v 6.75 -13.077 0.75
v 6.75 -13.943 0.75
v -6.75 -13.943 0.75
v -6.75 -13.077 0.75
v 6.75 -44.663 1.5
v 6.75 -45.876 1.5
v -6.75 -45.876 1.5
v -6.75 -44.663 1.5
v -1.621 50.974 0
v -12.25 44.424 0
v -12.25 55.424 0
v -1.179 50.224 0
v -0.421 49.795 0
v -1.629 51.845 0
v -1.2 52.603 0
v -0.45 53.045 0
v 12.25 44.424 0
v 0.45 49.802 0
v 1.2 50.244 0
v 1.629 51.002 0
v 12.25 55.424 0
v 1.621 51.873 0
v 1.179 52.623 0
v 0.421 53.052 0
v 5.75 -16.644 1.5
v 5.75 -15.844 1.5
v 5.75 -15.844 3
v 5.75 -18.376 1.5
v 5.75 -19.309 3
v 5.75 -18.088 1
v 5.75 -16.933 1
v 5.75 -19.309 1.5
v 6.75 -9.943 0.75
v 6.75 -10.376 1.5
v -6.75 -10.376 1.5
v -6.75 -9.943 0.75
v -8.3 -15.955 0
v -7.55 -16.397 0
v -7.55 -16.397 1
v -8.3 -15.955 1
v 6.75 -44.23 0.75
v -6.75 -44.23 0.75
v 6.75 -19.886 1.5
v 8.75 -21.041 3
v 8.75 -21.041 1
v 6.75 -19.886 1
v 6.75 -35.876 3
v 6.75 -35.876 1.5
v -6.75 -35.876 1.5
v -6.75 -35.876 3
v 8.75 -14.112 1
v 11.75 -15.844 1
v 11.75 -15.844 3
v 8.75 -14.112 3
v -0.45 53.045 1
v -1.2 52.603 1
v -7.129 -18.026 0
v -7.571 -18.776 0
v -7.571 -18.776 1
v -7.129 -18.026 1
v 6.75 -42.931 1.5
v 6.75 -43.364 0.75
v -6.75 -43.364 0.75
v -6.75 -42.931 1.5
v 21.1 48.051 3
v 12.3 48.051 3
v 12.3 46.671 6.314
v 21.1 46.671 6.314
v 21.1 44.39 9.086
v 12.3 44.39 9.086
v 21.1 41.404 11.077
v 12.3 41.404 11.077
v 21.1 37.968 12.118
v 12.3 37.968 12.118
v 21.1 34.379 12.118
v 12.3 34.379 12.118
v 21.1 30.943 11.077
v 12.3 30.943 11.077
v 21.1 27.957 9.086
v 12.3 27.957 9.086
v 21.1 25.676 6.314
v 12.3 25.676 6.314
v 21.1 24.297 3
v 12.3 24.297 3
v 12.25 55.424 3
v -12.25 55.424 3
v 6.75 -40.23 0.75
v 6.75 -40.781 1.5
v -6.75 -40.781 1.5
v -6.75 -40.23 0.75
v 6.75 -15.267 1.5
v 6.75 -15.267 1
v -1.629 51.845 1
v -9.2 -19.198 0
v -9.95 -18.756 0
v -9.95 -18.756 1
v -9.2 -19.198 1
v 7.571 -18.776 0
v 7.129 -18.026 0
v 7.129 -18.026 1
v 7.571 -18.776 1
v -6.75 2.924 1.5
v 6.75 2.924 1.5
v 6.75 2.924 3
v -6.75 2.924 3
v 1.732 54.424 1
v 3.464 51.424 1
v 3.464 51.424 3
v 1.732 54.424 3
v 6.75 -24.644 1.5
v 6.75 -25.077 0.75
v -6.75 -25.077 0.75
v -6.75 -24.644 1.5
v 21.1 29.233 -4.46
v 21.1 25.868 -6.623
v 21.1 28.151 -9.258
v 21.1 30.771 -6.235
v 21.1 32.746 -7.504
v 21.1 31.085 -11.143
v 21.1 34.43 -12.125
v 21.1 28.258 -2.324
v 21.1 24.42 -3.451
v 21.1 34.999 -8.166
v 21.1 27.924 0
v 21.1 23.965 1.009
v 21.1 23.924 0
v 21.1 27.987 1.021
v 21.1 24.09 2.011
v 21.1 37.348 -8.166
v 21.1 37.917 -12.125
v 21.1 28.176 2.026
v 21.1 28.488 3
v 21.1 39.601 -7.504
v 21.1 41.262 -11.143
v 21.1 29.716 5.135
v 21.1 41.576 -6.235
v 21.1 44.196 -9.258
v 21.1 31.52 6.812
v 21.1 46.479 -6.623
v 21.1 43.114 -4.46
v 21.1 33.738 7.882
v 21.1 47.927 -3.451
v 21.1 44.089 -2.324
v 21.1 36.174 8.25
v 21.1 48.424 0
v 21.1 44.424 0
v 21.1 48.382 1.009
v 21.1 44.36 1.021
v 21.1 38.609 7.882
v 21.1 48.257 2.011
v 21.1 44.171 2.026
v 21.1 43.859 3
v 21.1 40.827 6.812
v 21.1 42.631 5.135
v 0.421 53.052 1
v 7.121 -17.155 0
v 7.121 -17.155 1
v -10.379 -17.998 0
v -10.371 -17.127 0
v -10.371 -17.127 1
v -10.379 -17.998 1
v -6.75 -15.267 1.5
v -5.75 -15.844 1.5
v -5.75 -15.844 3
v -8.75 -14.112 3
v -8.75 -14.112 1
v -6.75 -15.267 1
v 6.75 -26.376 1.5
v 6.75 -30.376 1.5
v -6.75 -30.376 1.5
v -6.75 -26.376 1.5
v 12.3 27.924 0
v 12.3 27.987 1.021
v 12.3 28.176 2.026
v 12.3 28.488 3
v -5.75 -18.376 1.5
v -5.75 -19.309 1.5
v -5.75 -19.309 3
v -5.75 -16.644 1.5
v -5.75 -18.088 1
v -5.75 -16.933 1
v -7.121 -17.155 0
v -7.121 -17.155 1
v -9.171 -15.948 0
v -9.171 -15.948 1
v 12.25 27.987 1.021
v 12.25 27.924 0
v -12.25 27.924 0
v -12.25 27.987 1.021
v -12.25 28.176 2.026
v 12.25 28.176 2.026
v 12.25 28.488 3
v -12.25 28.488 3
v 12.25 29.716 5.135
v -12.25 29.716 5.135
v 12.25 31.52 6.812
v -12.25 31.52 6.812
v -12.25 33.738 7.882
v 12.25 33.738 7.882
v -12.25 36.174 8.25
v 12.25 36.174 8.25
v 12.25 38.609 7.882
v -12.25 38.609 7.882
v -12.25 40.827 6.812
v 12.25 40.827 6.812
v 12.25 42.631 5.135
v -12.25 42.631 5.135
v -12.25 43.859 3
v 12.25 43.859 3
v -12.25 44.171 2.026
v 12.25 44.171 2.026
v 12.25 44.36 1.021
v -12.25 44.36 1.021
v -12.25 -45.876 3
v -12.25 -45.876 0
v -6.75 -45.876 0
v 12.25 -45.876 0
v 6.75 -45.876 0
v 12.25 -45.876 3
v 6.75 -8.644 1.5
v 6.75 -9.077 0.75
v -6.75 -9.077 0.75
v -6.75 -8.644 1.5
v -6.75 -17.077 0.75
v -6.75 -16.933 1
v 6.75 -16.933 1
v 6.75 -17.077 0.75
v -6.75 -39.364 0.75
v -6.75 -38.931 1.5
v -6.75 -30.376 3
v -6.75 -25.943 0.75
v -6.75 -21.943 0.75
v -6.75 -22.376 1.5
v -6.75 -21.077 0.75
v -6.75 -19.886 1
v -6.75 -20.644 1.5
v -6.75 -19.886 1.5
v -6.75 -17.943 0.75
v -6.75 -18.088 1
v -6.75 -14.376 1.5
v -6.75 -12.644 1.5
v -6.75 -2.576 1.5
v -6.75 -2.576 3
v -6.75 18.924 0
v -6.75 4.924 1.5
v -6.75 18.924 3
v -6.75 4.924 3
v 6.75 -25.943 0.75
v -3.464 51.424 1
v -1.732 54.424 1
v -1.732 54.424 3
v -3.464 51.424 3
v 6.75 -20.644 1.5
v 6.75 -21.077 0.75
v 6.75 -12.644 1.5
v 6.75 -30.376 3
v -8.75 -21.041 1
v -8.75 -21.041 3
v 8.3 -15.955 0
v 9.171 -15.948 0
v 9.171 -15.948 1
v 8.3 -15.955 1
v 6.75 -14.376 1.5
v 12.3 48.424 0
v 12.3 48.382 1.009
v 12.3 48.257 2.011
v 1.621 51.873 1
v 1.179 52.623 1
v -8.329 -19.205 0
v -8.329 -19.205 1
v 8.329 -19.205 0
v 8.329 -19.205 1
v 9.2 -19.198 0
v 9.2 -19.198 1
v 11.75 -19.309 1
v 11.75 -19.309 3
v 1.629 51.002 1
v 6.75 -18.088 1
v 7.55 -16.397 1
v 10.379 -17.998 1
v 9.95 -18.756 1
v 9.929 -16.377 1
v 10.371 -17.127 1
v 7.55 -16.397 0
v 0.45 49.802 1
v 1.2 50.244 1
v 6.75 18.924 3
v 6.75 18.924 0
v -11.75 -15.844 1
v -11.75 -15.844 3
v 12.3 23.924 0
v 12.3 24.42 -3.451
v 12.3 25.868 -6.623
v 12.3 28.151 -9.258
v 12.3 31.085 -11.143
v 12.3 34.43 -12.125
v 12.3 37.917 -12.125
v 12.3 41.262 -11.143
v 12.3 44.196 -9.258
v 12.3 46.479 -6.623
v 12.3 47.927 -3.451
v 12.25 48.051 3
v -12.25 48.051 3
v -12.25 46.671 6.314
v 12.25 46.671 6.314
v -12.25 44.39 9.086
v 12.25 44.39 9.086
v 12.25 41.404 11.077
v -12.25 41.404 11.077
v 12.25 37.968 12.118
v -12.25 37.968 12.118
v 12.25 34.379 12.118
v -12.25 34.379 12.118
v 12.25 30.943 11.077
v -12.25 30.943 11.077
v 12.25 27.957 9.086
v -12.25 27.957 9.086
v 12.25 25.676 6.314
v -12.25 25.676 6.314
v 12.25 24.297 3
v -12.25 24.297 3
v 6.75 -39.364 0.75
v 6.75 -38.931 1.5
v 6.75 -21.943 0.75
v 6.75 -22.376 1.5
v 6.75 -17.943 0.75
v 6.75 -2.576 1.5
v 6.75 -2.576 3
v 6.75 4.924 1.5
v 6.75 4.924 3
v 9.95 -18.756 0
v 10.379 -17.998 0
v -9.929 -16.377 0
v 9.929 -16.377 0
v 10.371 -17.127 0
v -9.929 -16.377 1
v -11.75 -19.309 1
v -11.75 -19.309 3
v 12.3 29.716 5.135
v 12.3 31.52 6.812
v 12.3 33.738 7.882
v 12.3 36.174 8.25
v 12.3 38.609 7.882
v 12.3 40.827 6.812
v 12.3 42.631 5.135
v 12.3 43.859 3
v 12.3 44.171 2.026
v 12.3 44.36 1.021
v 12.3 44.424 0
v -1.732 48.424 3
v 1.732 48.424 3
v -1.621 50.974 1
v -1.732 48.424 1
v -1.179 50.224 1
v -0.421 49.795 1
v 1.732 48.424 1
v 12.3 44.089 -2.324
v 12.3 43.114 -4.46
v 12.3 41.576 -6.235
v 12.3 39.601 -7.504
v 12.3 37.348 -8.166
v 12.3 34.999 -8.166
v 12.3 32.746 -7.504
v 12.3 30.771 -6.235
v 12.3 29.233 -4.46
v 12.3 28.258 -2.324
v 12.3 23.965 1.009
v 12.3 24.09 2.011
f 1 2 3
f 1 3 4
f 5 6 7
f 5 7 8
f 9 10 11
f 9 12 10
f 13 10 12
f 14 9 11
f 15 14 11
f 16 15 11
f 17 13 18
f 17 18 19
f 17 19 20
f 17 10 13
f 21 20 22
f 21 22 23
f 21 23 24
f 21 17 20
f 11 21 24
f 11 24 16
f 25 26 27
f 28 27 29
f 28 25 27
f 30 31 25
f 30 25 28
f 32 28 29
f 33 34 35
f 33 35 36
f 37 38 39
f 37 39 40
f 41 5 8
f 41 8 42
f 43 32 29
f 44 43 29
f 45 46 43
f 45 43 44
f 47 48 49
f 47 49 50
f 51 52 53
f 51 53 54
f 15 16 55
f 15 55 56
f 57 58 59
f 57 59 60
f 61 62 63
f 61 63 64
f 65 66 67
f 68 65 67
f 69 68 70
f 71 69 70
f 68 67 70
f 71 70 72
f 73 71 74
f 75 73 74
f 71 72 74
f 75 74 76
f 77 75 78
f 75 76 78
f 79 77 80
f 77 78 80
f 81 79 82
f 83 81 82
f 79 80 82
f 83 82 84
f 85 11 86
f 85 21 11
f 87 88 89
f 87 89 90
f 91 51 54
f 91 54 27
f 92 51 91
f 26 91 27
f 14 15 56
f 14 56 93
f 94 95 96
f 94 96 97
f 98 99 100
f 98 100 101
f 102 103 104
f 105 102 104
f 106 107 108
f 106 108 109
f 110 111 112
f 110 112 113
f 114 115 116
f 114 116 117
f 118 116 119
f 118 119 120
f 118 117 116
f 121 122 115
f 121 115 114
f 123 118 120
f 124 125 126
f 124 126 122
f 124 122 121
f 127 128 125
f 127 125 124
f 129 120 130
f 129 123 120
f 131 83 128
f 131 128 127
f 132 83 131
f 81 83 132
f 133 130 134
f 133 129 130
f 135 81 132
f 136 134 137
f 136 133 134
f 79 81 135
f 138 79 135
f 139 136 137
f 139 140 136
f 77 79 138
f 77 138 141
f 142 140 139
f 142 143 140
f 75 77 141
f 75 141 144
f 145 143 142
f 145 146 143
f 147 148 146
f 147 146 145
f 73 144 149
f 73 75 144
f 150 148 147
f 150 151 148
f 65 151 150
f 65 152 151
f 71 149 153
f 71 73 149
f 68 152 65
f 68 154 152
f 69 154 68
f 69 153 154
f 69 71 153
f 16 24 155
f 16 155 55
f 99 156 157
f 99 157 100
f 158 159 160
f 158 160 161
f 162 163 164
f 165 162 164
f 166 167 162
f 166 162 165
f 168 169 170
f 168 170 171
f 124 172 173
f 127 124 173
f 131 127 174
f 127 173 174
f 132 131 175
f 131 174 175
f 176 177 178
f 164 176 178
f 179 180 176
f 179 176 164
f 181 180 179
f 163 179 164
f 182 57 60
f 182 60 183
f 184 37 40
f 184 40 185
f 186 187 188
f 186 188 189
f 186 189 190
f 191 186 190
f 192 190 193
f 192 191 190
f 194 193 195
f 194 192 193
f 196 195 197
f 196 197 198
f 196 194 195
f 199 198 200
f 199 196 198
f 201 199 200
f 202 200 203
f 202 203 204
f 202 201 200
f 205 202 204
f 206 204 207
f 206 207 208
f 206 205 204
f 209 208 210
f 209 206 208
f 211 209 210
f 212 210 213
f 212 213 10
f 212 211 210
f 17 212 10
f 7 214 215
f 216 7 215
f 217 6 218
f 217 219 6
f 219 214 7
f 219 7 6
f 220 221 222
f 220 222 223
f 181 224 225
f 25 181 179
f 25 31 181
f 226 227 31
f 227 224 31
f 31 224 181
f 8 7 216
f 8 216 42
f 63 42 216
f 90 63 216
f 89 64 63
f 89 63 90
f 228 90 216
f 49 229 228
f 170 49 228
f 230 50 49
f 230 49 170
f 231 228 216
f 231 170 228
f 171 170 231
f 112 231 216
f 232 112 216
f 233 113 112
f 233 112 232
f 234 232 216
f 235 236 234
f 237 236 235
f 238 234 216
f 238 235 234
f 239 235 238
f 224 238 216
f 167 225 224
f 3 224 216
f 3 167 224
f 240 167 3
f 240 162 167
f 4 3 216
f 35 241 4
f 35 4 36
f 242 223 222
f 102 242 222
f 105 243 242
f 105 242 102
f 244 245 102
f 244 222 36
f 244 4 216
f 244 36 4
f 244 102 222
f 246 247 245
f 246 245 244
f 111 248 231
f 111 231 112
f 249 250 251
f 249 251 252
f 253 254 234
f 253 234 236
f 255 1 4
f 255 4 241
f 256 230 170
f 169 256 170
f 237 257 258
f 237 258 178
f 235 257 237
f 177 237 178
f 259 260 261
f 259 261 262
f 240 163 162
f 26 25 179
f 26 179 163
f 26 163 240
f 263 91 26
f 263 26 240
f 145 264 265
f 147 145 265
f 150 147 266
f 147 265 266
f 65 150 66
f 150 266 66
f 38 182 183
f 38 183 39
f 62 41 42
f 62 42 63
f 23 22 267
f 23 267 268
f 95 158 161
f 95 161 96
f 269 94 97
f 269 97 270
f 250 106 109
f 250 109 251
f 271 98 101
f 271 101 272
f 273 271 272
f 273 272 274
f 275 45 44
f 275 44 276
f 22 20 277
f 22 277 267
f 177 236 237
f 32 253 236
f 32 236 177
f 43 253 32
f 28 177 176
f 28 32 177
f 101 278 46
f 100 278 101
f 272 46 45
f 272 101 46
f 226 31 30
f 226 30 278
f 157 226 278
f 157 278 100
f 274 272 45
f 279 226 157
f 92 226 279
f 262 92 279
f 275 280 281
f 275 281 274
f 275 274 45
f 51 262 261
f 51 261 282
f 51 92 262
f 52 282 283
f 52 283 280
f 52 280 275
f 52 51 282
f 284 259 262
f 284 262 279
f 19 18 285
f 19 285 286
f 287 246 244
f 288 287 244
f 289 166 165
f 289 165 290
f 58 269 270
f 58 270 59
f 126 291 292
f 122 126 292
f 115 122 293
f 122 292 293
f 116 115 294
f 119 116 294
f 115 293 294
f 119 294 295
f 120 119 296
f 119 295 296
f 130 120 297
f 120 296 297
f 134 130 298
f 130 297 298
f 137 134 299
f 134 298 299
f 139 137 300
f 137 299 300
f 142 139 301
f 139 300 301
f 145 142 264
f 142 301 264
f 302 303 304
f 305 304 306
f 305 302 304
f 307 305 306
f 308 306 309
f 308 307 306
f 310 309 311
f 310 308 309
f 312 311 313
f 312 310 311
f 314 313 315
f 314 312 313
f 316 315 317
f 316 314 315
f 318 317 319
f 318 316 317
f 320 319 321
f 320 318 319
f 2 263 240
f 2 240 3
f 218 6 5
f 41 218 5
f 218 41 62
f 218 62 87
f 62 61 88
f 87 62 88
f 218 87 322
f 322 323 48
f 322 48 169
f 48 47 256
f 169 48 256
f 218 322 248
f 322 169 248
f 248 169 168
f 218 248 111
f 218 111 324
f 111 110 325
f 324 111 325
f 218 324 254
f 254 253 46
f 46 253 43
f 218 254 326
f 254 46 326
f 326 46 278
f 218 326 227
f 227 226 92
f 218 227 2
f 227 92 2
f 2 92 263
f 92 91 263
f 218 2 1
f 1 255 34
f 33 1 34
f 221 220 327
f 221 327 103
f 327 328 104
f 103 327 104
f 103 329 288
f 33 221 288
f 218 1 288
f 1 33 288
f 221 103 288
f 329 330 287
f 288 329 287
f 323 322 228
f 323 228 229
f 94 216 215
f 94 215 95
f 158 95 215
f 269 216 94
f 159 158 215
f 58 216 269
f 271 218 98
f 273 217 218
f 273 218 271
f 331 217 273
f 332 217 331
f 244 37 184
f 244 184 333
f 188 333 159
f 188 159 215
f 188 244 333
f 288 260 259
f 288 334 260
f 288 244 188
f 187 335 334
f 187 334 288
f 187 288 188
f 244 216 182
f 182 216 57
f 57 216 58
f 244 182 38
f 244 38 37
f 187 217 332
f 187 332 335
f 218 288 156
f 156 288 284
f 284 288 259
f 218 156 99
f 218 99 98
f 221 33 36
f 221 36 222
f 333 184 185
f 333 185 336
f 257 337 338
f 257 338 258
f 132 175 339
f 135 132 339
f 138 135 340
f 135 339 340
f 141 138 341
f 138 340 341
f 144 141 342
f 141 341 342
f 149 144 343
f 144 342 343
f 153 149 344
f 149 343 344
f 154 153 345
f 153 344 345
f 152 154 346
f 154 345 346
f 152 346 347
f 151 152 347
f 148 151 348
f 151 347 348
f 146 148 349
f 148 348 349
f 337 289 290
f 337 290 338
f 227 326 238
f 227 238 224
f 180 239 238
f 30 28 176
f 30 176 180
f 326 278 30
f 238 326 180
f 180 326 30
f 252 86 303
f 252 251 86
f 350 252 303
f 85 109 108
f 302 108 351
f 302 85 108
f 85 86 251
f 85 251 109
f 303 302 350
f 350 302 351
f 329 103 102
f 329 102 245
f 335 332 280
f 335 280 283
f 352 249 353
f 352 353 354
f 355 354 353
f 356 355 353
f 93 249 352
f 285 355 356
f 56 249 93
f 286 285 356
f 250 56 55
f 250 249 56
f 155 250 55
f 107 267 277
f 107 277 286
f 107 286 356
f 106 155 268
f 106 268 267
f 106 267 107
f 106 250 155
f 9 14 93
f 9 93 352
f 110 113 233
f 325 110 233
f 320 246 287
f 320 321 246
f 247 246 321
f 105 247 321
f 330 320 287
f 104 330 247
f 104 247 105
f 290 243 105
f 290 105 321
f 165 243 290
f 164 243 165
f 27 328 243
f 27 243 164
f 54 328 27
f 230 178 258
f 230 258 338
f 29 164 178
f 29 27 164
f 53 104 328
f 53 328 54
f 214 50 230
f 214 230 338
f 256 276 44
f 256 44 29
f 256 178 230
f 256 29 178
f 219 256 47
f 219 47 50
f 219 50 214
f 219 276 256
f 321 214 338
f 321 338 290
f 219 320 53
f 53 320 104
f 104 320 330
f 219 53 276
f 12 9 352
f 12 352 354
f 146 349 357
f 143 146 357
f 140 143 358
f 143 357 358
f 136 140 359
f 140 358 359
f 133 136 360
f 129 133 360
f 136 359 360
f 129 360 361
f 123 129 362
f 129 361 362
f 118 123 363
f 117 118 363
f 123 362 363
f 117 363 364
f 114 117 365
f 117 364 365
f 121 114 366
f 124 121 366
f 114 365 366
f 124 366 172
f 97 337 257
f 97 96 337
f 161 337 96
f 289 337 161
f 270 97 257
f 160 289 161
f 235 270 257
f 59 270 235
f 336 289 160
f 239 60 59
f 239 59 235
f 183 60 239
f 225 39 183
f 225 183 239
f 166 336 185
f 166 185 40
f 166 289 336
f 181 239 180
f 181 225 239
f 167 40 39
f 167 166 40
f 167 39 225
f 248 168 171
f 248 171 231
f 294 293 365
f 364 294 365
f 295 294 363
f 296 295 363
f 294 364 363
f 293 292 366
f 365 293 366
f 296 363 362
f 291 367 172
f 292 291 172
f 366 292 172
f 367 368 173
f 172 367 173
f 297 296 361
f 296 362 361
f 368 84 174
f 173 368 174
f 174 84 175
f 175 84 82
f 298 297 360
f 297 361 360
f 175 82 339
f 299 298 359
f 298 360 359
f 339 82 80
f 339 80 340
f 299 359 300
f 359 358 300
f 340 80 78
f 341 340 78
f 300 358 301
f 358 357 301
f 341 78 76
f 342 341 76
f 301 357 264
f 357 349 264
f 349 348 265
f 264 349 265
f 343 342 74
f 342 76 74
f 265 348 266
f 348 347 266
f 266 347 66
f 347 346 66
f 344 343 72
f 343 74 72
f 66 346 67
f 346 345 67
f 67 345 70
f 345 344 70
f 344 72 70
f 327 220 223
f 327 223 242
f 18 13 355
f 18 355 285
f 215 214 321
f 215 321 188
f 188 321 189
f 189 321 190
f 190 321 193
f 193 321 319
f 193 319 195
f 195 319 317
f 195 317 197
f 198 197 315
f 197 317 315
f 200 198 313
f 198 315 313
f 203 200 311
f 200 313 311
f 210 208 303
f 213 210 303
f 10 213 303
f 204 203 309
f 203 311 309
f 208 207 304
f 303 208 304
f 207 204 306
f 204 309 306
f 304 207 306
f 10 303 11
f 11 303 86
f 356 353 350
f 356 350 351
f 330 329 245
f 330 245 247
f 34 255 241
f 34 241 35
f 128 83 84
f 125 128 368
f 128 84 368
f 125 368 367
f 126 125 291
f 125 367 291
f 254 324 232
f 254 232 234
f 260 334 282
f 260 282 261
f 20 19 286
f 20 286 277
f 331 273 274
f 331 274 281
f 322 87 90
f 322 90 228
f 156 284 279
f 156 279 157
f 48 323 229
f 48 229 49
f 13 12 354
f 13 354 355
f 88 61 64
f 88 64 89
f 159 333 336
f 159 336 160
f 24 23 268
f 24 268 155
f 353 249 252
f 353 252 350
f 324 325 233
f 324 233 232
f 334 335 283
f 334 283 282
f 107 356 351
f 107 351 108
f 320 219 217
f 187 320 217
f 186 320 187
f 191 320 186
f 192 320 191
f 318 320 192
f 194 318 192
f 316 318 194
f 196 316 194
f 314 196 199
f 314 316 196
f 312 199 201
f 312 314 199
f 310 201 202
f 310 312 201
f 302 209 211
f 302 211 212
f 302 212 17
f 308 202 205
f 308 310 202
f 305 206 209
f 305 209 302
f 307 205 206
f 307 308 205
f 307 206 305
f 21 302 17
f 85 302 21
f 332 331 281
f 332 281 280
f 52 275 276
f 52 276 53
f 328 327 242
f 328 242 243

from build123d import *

# Parameters (mm, degrees)
F1_START = 6.75
F0_W     = 14
F0_H     = 1.5
F0_W_2   = 2
F0_W_3   = 5.5
F1_DEPTH = 5.5
F2_DEPTH = 6.75
F5_DEPTH = 6
F6_START = 1
F6_DEPTH = 24
F7_START = 12.3
F7_DEPTH = 8.8


with BuildPart() as f1:
    # F0 (on Right) → F1 (new body)
    with BuildSketch(Plane.YZ.offset(F1_START)):
        with BuildLine():
            ThreePointArc((48.0505140551, 3), (48.3299262154, 1.5115512524), (48.4235405349, 0))
            Line((48.4235405349, 0), (55.4235405349, 0))
            Line((55.4235405349, 0), (55.4235405349, 3))
            Line((55.4235405349, 3), (48.0505140551, 3))
        make_face()
        with BuildLine():
            Line((44.4235405349, 0), (48.4235405349, 0))
            ThreePointArc((48.4235405349, 0), (48.3299262154, 1.5115512524), (48.0505140551, 3))
            Line((48.0505140551, 3), (43.8587536094, 3))
            ThreePointArc((43.8587536094, 3), (44.2811143972, 1.5263505717), (44.4235405349, 0))
        make_face()
        with BuildLine():
            ThreePointArc((48.0505140551, 3), (36.1735405349, 12.25), (24.2965670147, 3))
            Line((24.2965670147, 3), (28.4883274605, 3))
            ThreePointArc((28.4883274605, 3), (36.1735405349, 8.25), (43.8587536094, 3))
            Line((43.8587536094, 3), (48.0505140551, 3))
        make_face()
        with BuildLine():
            ThreePointArc((24.2965670147, 3), (24.0171548545, 1.5115512524), (23.9235405349, 0))
            Line((23.9235405349, 0), (27.9235405349, 0))
            ThreePointArc((27.9235405349, 0), (28.0659666727, 1.5263505717), (28.4883274605, 3))
            Line((28.4883274605, 3), (24.2965670147, 3))
        make_face()
        with BuildLine():
            Line((18.9235405349, 1.5), (18.9235405349, 0))
            Line((18.9235405349, 0), (23.9235405349, 0))
            ThreePointArc((23.9235405349, 0), (24.0171548545, 1.5115512524), (24.2965670147, 3))
            Line((24.2965670147, 3), (18.9235405349, 3))
            Line((18.9235405349, 3), (18.9235405349, 1.5))
        make_face()
        with Locations((11.9235405349, 2.25)):
            Rectangle(F0_W, F0_H)
        with Locations((3.9235405349, 2.25)):
            Rectangle(F0_W_2, F0_H)
        Polygon((-44.6627688753, 1.5), (-45.8764594651, 1.5), (-45.8764594651, 0), (18.9235405349, 0), (18.9235405349, 1.5), (4.9235405349, 1.5), (2.9235405349, 1.5), (-2.5764594651, 1.5), (-8.6444086575, 1.5), (-9.0774213594, 0.75), (-9.9434467632, 0.75), (-10.3764594651, 1.5), (-12.6444086575, 1.5), (-13.0774213594, 0.75), (-13.9434467632, 0.75), (-14.3764594651, 1.5), (-16.6444086575, 1.5), (-17.0774213594, 0.75), (-17.9434467632, 0.75), (-18.3764594651, 1.5), (-20.6444086575, 1.5), (-21.0774213594, 0.75), (-21.9434467632, 0.75), (-22.3764594651, 1.5), (-24.6444086575, 1.5), (-25.0774213594, 0.75), (-25.9434467632, 0.75), (-26.3764594651, 1.5), (-30.3764594651, 1.5), (-35.8764594651, 1.5), (-38.9307180678, 1.5), (-39.3637307697, 0.75), (-40.2297561734, 0.75), (-40.7805591822, 1.5), (-42.9307180678, 1.5), (-43.3637307697, 0.75), (-44.2297561734, 0.75), align=None)
        with Locations((0.1735405349, 2.25)):
            Rectangle(F0_W_3, F0_H)
        Polygon((-2.5764594651, 3), (-30.3764594651, 3), (-30.3764594651, 1.5), (-26.3764594651, 1.5), (-24.6444086575, 1.5), (-22.3764594651, 1.5), (-20.6444086575, 1.5), (-18.3764594651, 1.5), (-16.6444086575, 1.5), (-14.3764594651, 1.5), (-12.6444086575, 1.5), (-10.3764594651, 1.5), (-8.6444086575, 1.5), (-2.5764594651, 1.5), align=None)
        Polygon((-9.0774213594, 0.75), (-8.6444086575, 1.5), (-10.3764594651, 1.5), (-9.9434467632, 0.75), align=None)
        Polygon((-13.0774213594, 0.75), (-12.6444086575, 1.5), (-14.3764594651, 1.5), (-13.9434467632, 0.75), align=None)
        Polygon((-16.6444086575, 1.5), (-18.3764594651, 1.5), (-17.9434467632, 0.75), (-17.0774213594, 0.75), align=None)
        Polygon((-20.6444086575, 1.5), (-22.3764594651, 1.5), (-21.9434467632, 0.75), (-21.0774213594, 0.75), align=None)
        Polygon((-39.3637307697, 0.75), (-38.9307180678, 1.5), (-40.7805591822, 1.5), (-40.2297561734, 0.75), align=None)
        Polygon((-35.8764594651, 3), (-45.8764594651, 3), (-45.8764594651, 1.5), (-44.6627688753, 1.5), (-42.9307180678, 1.5), (-40.7805591822, 1.5), (-38.9307180678, 1.5), (-35.8764594651, 1.5), align=None)
        with Locations((-33.1264594651, 2.25)):
            Rectangle(F0_W_3, F0_H)
        Polygon((-42.9307180678, 1.5), (-44.6627688753, 1.5), (-44.2297561734, 0.75), (-43.3637307697, 0.75), align=None)
        Polygon((-24.6444086575, 1.5), (-26.3764594651, 1.5), (-25.9434467632, 0.75), (-25.0774213594, 0.75), align=None)
    extrude(amount=F1_DEPTH)

    # F0 (on Right) → F2 (join)
    with BuildSketch(Plane.YZ):
        with BuildLine():
            Line((18.9235405349, 1.5), (18.9235405349, 0))
            Line((18.9235405349, 0), (23.9235405349, 0))
            ThreePointArc((23.9235405349, 0), (24.0171548545, 1.5115512524), (24.2965670147, 3))
            Line((24.2965670147, 3), (18.9235405349, 3))
            Line((18.9235405349, 3), (18.9235405349, 1.5))
        make_face()
        with BuildLine():
            ThreePointArc((24.2965670147, 3), (24.0171548545, 1.5115512524), (23.9235405349, 0))
            Line((23.9235405349, 0), (27.9235405349, 0))
            ThreePointArc((27.9235405349, 0), (28.0659666727, 1.5263505717), (28.4883274605, 3))
            Line((28.4883274605, 3), (24.2965670147, 3))
        make_face()
        with BuildLine():
            ThreePointArc((48.0505140551, 3), (36.1735405349, 12.25), (24.2965670147, 3))
            Line((24.2965670147, 3), (28.4883274605, 3))
            ThreePointArc((28.4883274605, 3), (36.1735405349, 8.25), (43.8587536094, 3))
            Line((43.8587536094, 3), (48.0505140551, 3))
        make_face()
        with BuildLine():
            Line((44.4235405349, 0), (48.4235405349, 0))
            ThreePointArc((48.4235405349, 0), (48.3299262154, 1.5115512524), (48.0505140551, 3))
            Line((48.0505140551, 3), (43.8587536094, 3))
            ThreePointArc((43.8587536094, 3), (44.2811143972, 1.5263505717), (44.4235405349, 0))
        make_face()
        with BuildLine():
            ThreePointArc((48.0505140551, 3), (48.3299262154, 1.5115512524), (48.4235405349, 0))
            Line((48.4235405349, 0), (55.4235405349, 0))
            Line((55.4235405349, 0), (55.4235405349, 3))
            Line((55.4235405349, 3), (48.0505140551, 3))
        make_face()
        with Locations((3.9235405349, 2.25)):
            Rectangle(F0_W_2, F0_H)
        Polygon((-2.5764594651, 3), (-30.3764594651, 3), (-30.3764594651, 1.5), (-26.3764594651, 1.5), (-24.6444086575, 1.5), (-22.3764594651, 1.5), (-20.6444086575, 1.5), (-18.3764594651, 1.5), (-16.6444086575, 1.5), (-14.3764594651, 1.5), (-12.6444086575, 1.5), (-10.3764594651, 1.5), (-8.6444086575, 1.5), (-2.5764594651, 1.5), align=None)
        Polygon((-9.0774213594, 0.75), (-8.6444086575, 1.5), (-10.3764594651, 1.5), (-9.9434467632, 0.75), align=None)
        Polygon((-13.0774213594, 0.75), (-12.6444086575, 1.5), (-14.3764594651, 1.5), (-13.9434467632, 0.75), align=None)
        Polygon((-16.6444086575, 1.5), (-18.3764594651, 1.5), (-17.9434467632, 0.75), (-17.0774213594, 0.75), align=None)
        Polygon((-20.6444086575, 1.5), (-22.3764594651, 1.5), (-21.9434467632, 0.75), (-21.0774213594, 0.75), align=None)
        Polygon((-24.6444086575, 1.5), (-26.3764594651, 1.5), (-25.9434467632, 0.75), (-25.0774213594, 0.75), align=None)
        Polygon((-35.8764594651, 3), (-45.8764594651, 3), (-45.8764594651, 1.5), (-44.6627688753, 1.5), (-42.9307180678, 1.5), (-40.7805591822, 1.5), (-38.9307180678, 1.5), (-35.8764594651, 1.5), align=None)
        Polygon((-42.9307180678, 1.5), (-44.6627688753, 1.5), (-44.2297561734, 0.75), (-43.3637307697, 0.75), align=None)
        Polygon((-39.3637307697, 0.75), (-38.9307180678, 1.5), (-40.7805591822, 1.5), (-40.2297561734, 0.75), align=None)
    extrude(amount=F2_DEPTH)

    # F3: F1 across plane


with BuildPart() as f1_1:
    add(f1.part)
    add(f1.part.mirror(Plane.YZ))

    # F4 (on Top) → F5 (cut)
    with BuildSketch(Plane.XY):
        Polygon((-7.570830866, -18.7763650857), (-7.1288567643, -18.0260236477), (-7.1212666834, -17.15522185), (-7.5500943794, -16.397290331), (-8.3004358174, -15.9553162293), (-9.1712376151, -15.9477261485), (-9.929169134, -16.3765538444), (-10.3711432357, -17.1268952825), (-10.3787333166, -17.9976970802), (-9.9499056206, -18.7556285991), (-9.1995641826, -19.1976027008), (-8.3287623849, -19.2051927817), align=None)
        Polygon((8.3004358174, -15.9553162293), (7.5500943794, -16.397290331), (7.1212666834, -17.15522185), (7.1288567643, -18.0260236477), (7.570830866, -18.7763650857), (8.3287623849, -19.2051927817), (9.1995641826, -19.1976027008), (9.9499056206, -18.7556285991), (10.3787333166, -17.9976970802), (10.3711432357, -17.1268952825), (9.929169134, -16.3765538444), (9.1712376151, -15.9477261485), align=None)
        Polygon((1.6211432357, 51.8731047175), (1.179169134, 52.6234461556), (0.4212376151, 53.0522738515), (-0.4495641826, 53.0446837707), (-1.1999056206, 52.602709669), (-1.6287333166, 51.84477815), (-1.6211432357, 50.9739763523), (-1.179169134, 50.2236349143), (-0.4212376151, 49.7948072183), (0.4495641826, 49.8023972992), (1.1999056206, 50.2443714009), (1.6287333166, 51.0023029198), align=None)
    extrude(amount=F5_DEPTH, mode=Mode.SUBTRACT)

    # F4 (on Top) → F6 (cut)
    with BuildSketch(Plane.XY.offset(F6_START)):
        Polygon((1.7320508076, 48.4235405349), (3.4641016151, 51.4235405349), (1.7320508076, 54.4235405349), (-1.7320508076, 54.4235405349), (-3.4641016151, 51.4235405349), (-1.7320508076, 48.4235405349), align=None)
        Polygon((0.4212376151, 53.0522738515), (1.179169134, 52.6234461556), (1.6211432357, 51.8731047175), (1.6287333166, 51.0023029198), (1.1999056206, 50.2443714009), (0.4495641826, 49.8023972992), (-0.4212376151, 49.7948072183), (-1.179169134, 50.2236349143), (-1.6211432357, 50.9739763523), (-1.6287333166, 51.84477815), (-1.1999056206, 52.602709669), (-0.4495641826, 53.0446837707), align=None, mode=Mode.SUBTRACT)
        Polygon((-5.75, -15.8444086575), (-8.75, -14.1123578499), (-11.75, -15.8444086575), (-11.75, -19.3085102726), (-8.75, -21.0405610802), (-5.75, -19.3085102726), align=None)
        Polygon((-7.1212666834, -17.15522185), (-7.1288567643, -18.0260236477), (-7.570830866, -18.7763650857), (-8.3287623849, -19.2051927817), (-9.1995641826, -19.1976027008), (-9.9499056206, -18.7556285991), (-10.3787333166, -17.9976970802), (-10.3711432357, -17.1268952825), (-9.929169134, -16.3765538444), (-9.1712376151, -15.9477261485), (-8.3004358174, -15.9553162293), (-7.5500943794, -16.397290331), align=None, mode=Mode.SUBTRACT)
        Polygon((11.75, -15.8444086575), (8.75, -14.1123578499), (5.75, -15.8444086575), (5.75, -19.3085102726), (8.75, -21.0405610802), (11.75, -19.3085102726), align=None)
        Polygon((7.1212666834, -17.15522185), (7.5500943794, -16.397290331), (8.3004358174, -15.9553162293), (9.1712376151, -15.9477261485), (9.929169134, -16.3765538444), (10.3711432357, -17.1268952825), (10.3787333166, -17.9976970802), (9.9499056206, -18.7556285991), (9.1995641826, -19.1976027008), (8.3287623849, -19.2051927817), (7.570830866, -18.7763650857), (7.1288567643, -18.0260236477), align=None, mode=Mode.SUBTRACT)
    extrude(amount=F6_DEPTH, mode=Mode.SUBTRACT)


with BuildPart() as f7:
    # F0 (on Right) → F7 (new body)
    with BuildSketch(Plane.YZ.offset(F7_START)):
        with BuildLine():
            ThreePointArc((48.0505140551, 3), (36.1735405349, 12.25), (24.2965670147, 3))
            Line((24.2965670147, 3), (28.4883274605, 3))
            ThreePointArc((28.4883274605, 3), (36.1735405349, 8.25), (43.8587536094, 3))
            Line((43.8587536094, 3), (48.0505140551, 3))
        make_face()
        with BuildLine():
            ThreePointArc((24.2965670147, 3), (24.0171548545, 1.5115512524), (23.9235405349, 0))
            Line((23.9235405349, 0), (27.9235405349, 0))
            ThreePointArc((27.9235405349, 0), (28.0659666727, 1.5263505717), (28.4883274605, 3))
            Line((28.4883274605, 3), (24.2965670147, 3))
        make_face()
        with BuildLine():
            Line((44.4235405349, 0), (48.4235405349, 0))
            ThreePointArc((48.4235405349, 0), (48.3299262154, 1.5115512524), (48.0505140551, 3))
            Line((48.0505140551, 3), (43.8587536094, 3))
            ThreePointArc((43.8587536094, 3), (44.2811143972, 1.5263505717), (44.4235405349, 0))
        make_face()
        with BuildLine():
            Line((27.9235405349, 0), (23.9235405349, 0))
            ThreePointArc((23.9235405349, 0), (36.1735405349, -12.25), (48.4235405349, 0))
            Line((48.4235405349, 0), (44.4235405349, 0))
            ThreePointArc((44.4235405349, 0), (36.1735405349, -8.25), (27.9235405349, 0))
        make_face()
    extrude(amount=F7_DEPTH)


solid = Compound([f1_1.part, f7.part])
